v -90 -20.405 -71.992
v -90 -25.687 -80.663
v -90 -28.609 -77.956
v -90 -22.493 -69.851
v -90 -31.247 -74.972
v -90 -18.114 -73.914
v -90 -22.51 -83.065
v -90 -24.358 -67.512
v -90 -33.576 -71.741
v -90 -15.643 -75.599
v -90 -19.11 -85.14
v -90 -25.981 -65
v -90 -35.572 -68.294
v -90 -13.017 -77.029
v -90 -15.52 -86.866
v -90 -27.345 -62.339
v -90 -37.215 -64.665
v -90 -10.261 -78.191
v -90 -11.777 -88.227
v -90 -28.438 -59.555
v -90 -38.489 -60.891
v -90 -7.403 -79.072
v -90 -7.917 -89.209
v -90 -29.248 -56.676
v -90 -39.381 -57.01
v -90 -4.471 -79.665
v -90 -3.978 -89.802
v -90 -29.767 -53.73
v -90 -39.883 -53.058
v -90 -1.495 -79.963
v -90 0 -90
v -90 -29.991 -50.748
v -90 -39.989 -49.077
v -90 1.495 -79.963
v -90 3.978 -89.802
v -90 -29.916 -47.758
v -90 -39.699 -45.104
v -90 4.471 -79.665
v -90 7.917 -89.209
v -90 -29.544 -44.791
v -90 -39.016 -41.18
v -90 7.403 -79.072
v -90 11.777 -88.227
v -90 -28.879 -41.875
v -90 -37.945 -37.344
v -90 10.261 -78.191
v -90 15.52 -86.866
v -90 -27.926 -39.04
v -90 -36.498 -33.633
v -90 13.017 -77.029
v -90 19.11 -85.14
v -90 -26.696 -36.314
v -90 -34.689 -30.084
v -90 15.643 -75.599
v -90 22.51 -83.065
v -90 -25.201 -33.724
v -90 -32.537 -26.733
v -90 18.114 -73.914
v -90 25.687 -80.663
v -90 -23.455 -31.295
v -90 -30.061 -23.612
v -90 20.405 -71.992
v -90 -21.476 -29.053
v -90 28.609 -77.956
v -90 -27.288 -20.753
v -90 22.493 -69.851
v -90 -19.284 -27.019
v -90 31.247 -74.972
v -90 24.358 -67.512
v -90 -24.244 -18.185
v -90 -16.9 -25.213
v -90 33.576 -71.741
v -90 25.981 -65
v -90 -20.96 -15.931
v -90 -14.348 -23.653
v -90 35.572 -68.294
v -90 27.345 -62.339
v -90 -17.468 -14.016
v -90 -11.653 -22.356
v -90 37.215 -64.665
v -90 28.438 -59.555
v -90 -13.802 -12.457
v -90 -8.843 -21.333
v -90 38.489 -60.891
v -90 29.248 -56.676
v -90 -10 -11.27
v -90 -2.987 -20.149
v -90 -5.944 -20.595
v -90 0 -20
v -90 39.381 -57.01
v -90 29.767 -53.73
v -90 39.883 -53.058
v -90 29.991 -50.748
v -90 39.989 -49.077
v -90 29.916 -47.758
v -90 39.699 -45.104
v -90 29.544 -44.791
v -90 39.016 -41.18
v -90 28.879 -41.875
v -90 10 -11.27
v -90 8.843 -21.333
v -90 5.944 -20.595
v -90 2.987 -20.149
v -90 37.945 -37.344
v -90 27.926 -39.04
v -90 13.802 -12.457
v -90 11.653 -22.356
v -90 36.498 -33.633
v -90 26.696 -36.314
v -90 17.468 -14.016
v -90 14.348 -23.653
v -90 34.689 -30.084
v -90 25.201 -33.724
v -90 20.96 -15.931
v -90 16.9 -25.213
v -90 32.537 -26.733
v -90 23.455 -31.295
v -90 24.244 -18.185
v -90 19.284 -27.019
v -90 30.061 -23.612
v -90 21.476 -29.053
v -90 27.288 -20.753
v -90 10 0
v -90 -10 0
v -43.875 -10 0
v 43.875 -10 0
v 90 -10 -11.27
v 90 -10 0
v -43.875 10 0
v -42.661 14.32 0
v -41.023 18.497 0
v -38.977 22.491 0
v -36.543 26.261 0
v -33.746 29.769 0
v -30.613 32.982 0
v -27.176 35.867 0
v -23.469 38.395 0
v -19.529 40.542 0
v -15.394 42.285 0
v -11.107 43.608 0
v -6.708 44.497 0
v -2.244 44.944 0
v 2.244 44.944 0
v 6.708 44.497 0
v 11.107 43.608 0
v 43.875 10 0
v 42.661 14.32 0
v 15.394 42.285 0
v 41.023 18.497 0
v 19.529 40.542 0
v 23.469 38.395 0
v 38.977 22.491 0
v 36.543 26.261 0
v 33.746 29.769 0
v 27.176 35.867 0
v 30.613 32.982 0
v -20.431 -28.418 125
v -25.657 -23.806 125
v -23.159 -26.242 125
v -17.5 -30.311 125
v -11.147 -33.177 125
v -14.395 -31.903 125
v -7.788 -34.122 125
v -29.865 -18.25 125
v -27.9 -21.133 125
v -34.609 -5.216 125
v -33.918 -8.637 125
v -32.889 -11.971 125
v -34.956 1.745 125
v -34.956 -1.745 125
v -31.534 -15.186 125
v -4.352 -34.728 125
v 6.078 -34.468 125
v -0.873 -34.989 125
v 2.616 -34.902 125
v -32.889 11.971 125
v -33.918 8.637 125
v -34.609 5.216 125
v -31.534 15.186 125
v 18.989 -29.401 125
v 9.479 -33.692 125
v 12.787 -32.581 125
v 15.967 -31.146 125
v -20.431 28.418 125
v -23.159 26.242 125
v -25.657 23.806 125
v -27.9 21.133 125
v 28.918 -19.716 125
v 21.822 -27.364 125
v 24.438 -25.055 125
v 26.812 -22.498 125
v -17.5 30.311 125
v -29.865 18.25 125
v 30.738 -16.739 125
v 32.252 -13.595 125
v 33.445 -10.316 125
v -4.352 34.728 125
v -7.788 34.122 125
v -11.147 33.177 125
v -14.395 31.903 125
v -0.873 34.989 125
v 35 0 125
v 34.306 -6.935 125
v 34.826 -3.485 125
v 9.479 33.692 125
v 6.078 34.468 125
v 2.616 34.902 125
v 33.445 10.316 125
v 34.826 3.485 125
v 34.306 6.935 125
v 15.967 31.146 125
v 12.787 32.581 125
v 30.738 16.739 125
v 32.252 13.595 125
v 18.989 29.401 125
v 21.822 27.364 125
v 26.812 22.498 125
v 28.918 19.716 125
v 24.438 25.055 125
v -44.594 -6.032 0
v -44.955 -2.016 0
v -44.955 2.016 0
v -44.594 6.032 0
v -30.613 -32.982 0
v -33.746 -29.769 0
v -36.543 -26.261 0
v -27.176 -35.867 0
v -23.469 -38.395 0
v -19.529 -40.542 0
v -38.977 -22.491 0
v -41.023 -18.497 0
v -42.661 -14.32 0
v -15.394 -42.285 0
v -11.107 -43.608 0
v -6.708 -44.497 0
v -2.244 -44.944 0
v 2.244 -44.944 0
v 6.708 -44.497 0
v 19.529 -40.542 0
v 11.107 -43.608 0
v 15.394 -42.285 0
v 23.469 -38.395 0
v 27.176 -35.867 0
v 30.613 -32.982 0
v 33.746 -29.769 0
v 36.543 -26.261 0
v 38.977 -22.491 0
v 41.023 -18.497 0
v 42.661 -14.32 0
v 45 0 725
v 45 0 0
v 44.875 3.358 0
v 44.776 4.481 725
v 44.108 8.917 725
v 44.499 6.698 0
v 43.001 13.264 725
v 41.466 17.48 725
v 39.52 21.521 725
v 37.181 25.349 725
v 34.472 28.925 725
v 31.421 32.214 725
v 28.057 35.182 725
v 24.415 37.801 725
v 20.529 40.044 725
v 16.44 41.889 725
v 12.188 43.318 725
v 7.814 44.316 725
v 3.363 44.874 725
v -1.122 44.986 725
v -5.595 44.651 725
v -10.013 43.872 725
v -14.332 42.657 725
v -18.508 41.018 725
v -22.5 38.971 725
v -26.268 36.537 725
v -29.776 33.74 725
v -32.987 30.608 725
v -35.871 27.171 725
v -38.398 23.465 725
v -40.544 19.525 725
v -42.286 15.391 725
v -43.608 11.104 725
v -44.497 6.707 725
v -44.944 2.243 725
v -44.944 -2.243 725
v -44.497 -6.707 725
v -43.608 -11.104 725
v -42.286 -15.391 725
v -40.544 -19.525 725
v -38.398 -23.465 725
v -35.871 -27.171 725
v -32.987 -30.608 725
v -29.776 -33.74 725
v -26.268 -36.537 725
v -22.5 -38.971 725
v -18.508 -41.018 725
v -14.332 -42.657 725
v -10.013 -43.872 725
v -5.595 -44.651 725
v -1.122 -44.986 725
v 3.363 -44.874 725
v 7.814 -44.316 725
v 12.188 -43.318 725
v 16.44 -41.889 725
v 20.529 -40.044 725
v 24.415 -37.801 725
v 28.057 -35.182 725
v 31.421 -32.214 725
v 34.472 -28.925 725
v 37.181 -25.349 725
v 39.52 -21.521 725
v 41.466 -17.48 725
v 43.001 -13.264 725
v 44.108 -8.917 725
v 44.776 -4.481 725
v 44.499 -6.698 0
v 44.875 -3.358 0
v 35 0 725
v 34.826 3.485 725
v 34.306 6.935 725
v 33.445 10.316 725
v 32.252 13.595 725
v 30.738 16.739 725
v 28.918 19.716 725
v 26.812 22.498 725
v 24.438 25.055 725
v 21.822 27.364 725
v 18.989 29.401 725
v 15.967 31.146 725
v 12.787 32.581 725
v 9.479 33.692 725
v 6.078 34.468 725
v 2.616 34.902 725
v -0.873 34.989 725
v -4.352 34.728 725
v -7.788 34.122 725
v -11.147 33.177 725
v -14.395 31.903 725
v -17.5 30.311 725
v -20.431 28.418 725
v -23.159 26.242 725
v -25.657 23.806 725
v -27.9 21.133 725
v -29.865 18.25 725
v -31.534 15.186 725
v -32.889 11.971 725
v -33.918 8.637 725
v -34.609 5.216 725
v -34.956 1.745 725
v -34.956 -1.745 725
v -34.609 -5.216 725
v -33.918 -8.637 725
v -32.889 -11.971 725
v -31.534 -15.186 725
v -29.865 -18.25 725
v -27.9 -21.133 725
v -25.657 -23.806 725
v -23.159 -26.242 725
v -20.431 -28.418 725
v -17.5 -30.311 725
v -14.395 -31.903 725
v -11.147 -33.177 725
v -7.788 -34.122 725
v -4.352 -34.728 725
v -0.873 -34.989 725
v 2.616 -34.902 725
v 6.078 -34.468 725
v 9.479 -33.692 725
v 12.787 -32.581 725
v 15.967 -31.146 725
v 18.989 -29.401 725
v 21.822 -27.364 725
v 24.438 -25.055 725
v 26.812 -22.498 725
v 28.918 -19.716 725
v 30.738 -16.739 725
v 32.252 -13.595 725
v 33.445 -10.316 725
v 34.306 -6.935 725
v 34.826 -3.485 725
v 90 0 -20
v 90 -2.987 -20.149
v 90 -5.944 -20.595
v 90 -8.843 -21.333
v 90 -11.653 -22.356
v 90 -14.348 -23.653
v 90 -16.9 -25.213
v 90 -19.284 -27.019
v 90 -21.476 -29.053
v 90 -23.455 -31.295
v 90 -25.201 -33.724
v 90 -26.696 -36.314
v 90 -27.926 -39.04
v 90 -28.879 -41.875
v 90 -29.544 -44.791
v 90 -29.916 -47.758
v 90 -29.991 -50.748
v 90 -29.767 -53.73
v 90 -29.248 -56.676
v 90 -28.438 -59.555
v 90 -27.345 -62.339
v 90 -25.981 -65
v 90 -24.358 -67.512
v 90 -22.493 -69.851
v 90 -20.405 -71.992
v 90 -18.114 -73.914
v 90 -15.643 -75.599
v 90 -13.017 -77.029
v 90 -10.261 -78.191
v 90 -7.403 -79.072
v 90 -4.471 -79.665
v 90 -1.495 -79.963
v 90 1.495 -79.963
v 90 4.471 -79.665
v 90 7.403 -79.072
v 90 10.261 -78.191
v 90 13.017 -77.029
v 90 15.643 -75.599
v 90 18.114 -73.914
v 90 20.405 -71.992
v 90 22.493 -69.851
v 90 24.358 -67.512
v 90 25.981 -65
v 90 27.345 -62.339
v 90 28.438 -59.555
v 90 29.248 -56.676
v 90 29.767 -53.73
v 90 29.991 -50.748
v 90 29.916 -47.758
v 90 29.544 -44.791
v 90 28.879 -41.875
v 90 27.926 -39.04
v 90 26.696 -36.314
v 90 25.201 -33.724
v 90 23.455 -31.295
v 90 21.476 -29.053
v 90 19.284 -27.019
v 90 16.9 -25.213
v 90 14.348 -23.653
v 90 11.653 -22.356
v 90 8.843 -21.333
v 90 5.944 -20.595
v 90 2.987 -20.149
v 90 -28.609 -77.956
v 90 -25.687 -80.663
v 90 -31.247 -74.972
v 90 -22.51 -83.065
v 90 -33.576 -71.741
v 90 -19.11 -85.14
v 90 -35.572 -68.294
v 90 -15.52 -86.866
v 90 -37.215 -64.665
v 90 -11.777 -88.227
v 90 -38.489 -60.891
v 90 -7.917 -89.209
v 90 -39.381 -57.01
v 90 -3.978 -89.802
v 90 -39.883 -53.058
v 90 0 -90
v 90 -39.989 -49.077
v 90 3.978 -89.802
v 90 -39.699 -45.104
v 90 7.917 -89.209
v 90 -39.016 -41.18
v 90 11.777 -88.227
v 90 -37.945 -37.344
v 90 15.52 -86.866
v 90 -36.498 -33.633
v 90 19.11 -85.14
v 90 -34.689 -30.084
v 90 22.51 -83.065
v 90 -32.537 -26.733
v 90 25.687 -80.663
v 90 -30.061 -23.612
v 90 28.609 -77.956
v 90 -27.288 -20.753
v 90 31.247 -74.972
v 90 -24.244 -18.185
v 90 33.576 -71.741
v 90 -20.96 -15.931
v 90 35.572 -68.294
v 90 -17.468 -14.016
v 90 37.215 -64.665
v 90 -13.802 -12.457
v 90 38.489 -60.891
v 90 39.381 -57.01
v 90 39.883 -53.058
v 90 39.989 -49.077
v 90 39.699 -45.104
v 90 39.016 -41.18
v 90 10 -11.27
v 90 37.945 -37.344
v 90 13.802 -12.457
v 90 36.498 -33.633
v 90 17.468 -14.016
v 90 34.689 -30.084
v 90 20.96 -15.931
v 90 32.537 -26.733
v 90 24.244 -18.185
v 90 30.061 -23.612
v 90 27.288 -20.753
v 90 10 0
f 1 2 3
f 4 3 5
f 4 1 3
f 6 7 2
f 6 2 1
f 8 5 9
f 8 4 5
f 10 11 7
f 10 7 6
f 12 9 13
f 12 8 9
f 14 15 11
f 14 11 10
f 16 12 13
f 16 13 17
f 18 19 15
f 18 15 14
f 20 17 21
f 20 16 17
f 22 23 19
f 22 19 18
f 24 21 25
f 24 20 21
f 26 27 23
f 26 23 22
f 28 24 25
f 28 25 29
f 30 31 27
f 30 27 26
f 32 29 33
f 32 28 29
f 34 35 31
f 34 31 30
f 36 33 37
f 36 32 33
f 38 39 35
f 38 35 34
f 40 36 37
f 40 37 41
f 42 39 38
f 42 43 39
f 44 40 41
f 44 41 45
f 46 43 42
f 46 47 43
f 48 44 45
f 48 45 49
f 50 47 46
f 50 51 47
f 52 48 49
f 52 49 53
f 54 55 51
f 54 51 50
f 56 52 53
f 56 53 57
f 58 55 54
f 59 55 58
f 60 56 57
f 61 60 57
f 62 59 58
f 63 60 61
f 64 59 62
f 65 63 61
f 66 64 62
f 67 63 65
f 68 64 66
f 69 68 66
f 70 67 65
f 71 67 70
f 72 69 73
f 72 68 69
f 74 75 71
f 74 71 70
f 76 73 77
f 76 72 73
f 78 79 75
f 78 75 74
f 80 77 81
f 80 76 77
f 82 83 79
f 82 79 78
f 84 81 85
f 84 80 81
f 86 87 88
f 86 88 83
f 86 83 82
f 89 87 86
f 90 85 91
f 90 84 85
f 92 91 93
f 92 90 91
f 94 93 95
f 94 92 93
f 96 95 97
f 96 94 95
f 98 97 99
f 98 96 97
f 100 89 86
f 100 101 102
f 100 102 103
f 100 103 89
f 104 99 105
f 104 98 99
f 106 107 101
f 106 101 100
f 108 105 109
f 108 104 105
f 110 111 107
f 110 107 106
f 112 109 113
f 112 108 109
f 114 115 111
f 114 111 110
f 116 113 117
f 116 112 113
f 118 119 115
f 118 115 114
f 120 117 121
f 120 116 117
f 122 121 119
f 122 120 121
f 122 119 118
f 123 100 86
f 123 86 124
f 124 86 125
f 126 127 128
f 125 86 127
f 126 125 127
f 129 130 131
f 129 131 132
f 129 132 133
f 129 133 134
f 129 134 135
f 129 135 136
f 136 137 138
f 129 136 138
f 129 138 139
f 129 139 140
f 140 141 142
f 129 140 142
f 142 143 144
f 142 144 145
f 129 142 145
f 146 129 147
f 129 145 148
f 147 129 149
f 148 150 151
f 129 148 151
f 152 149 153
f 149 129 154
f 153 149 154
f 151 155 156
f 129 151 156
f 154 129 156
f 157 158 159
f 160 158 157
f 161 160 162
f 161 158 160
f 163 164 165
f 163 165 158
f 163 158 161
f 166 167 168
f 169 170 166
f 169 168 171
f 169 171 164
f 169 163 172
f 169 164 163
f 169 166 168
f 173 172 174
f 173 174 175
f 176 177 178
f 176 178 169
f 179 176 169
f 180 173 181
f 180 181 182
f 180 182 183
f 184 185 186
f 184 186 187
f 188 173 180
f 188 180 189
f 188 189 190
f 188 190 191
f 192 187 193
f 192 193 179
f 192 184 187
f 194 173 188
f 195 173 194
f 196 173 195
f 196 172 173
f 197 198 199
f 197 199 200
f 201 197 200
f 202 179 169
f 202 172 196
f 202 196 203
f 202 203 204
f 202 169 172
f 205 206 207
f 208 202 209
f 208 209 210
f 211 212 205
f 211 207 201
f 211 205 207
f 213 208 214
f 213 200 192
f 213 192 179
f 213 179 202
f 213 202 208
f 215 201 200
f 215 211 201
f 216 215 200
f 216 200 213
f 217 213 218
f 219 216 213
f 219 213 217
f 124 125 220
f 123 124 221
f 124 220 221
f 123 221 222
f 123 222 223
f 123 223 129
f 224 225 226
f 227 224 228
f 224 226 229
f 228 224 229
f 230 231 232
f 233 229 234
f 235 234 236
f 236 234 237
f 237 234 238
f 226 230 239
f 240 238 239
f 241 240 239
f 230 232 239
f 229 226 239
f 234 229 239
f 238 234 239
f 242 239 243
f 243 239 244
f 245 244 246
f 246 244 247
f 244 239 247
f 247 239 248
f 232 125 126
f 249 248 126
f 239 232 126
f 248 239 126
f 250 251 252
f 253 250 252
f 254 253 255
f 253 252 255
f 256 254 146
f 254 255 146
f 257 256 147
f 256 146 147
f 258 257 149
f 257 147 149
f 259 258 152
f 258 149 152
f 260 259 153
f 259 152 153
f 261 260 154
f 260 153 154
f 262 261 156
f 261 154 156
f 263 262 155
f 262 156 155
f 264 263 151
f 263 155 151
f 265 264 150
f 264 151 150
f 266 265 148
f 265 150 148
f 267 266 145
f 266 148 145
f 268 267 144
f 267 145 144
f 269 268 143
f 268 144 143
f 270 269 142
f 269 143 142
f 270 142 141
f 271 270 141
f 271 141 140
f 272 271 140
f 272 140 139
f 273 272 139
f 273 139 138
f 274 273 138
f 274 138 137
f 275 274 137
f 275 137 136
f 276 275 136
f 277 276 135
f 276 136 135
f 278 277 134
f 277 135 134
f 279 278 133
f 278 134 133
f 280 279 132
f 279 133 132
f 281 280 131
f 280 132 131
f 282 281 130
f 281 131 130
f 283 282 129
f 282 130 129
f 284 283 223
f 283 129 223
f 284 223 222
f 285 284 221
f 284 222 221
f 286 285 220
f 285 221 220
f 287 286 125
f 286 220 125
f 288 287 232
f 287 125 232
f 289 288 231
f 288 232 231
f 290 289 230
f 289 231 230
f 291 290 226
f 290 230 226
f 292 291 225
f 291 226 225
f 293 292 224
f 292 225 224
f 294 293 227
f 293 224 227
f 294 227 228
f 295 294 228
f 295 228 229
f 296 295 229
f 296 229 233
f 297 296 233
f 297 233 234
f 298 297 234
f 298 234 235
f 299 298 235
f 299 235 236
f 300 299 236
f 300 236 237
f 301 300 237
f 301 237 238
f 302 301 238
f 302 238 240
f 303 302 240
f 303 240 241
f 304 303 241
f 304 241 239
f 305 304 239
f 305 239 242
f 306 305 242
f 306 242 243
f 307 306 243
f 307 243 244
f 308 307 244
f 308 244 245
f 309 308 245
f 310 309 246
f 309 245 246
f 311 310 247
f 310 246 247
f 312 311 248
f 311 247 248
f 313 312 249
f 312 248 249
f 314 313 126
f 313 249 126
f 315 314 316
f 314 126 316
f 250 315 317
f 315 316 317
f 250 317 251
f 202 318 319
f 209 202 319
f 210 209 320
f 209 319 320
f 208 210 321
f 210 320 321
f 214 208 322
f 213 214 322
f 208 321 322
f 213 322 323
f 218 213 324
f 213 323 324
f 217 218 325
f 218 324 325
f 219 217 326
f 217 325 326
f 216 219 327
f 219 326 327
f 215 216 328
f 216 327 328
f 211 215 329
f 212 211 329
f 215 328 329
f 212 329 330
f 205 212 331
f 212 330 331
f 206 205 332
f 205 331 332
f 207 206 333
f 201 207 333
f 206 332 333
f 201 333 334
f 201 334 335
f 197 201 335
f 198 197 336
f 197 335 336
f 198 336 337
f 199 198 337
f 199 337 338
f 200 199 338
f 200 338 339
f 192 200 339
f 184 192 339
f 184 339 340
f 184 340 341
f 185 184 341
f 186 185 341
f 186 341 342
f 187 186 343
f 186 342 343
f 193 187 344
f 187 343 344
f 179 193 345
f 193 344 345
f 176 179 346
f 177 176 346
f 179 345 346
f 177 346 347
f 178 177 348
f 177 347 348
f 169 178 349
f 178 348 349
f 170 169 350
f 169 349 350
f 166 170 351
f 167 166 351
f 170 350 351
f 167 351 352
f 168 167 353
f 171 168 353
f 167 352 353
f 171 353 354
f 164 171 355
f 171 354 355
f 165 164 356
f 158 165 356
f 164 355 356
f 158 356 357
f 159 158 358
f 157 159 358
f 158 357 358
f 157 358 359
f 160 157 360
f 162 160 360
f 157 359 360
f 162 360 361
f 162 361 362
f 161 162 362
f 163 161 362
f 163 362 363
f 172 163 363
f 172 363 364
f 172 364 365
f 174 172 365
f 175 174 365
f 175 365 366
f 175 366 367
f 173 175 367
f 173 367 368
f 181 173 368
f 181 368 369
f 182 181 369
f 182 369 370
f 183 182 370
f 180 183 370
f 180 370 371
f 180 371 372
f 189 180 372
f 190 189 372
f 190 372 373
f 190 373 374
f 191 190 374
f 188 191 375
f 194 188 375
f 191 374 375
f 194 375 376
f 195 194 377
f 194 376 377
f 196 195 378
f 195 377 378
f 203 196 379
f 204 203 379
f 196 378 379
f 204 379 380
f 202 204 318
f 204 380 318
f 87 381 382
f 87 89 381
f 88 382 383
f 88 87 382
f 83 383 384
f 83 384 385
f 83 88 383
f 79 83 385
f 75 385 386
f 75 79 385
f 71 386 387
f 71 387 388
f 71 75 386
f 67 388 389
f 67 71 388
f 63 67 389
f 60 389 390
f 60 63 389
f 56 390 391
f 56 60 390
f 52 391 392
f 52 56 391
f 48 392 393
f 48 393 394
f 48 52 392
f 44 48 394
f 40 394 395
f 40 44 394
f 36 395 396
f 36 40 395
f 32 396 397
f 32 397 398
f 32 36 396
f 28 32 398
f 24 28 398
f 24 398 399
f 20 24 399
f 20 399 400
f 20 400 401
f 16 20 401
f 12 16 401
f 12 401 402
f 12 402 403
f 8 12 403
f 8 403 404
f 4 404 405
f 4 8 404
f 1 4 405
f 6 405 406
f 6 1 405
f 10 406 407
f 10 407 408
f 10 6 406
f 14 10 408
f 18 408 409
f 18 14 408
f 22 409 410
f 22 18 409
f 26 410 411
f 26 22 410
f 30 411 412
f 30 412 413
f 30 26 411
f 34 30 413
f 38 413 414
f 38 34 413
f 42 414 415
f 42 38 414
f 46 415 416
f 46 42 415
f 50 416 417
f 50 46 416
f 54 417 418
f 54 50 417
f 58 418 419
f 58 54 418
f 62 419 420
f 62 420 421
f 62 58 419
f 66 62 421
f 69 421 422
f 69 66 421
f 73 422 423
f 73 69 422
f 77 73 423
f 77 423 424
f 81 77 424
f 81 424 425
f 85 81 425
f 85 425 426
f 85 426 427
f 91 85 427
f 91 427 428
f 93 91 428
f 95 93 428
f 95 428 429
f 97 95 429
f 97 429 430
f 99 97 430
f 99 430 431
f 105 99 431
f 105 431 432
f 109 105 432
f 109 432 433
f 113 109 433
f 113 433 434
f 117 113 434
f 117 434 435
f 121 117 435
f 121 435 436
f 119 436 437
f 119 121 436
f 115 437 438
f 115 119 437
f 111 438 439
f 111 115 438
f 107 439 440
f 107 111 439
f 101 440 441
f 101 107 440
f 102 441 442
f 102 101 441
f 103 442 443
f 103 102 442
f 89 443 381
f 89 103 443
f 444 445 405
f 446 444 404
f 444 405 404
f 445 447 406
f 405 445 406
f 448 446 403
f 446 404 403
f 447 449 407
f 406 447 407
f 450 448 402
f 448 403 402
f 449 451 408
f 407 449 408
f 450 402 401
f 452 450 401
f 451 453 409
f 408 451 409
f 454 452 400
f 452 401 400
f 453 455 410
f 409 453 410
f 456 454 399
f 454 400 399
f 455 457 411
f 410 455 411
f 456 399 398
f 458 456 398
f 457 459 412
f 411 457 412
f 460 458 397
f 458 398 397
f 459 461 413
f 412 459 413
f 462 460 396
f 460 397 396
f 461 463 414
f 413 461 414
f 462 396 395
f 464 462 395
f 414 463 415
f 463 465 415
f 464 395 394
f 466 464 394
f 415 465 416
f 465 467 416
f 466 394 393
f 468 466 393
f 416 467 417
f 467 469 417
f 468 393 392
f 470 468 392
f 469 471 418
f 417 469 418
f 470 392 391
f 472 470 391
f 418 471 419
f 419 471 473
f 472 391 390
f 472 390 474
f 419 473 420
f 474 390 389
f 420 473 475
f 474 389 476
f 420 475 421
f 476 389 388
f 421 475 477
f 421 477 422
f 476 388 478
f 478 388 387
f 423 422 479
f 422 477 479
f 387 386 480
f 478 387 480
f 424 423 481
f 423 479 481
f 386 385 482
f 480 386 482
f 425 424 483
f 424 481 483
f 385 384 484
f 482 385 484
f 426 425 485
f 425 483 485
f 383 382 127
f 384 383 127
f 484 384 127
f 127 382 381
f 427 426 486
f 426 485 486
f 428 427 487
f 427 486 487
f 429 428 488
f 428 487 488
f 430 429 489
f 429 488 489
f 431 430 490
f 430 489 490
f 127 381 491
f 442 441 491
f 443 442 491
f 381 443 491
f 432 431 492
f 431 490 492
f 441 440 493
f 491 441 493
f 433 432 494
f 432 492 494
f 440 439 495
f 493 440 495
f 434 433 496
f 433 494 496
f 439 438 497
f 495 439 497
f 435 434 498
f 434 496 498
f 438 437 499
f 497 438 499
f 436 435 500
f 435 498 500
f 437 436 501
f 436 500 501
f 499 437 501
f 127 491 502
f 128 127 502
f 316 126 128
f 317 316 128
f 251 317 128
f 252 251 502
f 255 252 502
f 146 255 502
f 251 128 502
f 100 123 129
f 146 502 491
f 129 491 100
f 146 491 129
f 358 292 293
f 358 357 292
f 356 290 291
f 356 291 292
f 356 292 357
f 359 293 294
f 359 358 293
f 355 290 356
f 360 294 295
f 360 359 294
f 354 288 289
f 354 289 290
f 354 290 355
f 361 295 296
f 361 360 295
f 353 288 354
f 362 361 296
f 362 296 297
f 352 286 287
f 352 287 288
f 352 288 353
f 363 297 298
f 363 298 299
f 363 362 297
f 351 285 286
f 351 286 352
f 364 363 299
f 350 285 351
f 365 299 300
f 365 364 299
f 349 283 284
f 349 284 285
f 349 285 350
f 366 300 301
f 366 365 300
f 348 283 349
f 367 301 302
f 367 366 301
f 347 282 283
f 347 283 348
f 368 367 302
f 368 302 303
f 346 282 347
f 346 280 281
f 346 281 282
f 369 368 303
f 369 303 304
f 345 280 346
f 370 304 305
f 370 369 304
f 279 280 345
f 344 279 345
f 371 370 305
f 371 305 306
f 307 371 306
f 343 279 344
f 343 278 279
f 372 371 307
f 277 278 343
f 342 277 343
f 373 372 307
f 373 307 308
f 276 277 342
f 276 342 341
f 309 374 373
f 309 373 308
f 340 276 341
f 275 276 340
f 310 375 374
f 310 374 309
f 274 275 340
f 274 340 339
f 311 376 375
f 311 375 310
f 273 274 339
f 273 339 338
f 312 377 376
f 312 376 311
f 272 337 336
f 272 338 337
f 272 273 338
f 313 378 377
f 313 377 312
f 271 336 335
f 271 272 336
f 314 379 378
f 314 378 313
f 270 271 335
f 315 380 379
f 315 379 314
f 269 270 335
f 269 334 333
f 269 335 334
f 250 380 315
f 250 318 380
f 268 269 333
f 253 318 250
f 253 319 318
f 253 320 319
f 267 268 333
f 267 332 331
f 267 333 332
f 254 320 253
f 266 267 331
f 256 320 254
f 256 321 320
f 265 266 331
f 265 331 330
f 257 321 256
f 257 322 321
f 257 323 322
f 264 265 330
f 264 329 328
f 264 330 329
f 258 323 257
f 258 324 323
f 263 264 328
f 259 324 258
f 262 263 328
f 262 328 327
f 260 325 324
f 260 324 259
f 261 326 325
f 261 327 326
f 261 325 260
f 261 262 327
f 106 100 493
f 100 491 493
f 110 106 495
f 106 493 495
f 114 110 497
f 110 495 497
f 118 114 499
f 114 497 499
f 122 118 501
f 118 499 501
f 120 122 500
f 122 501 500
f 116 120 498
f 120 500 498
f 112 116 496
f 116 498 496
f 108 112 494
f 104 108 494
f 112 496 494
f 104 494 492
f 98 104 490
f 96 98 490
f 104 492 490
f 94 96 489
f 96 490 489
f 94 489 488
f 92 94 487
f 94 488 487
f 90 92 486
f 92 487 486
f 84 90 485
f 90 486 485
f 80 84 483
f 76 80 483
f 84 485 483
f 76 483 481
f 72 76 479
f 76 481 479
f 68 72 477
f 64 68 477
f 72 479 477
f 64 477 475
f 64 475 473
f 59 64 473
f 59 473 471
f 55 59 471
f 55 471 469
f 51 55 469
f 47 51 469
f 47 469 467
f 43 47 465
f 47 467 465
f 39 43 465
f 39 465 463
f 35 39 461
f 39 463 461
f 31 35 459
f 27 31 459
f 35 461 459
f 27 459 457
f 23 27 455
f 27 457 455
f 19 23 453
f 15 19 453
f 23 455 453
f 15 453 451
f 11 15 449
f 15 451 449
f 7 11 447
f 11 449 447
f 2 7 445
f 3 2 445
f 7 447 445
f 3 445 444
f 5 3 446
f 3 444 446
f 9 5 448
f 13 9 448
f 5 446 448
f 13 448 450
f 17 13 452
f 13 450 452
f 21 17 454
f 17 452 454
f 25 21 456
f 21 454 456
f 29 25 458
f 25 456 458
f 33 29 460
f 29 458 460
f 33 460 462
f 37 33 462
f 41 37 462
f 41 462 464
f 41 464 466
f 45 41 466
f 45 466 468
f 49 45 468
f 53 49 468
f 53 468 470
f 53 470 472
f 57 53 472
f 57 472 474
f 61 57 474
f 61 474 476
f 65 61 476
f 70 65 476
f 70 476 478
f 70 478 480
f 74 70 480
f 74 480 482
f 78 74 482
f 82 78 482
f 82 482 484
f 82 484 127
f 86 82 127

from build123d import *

# Parameters (mm, degrees)
IZIM1_R                     = 45
Y_KSEKLIK_EKSTR_ZYON1_DEPTH = 725
IZIM2_R                     = 35
KES_EKSTR_ZYON1_DEPTH       = 600
IZIM3_R                     = 30
Y_KSEKLIK_EKSTR_ZYON2_DEPTH = 90


with BuildPart() as part:
    # Çizim1 → Yükseklik-Ekstrüzyon1 (new body)
    with BuildSketch(Plane.XY):
        Circle(IZIM1_R)
    extrude(amount=Y_KSEKLIK_EKSTR_ZYON1_DEPTH)

    # Çizim2 → Kes-Ekstrüzyon1 (cut)
    with BuildSketch(Plane.XY.offset(725)):
        Circle(IZIM2_R)
    extrude(amount=-KES_EKSTR_ZYON1_DEPTH, mode=Mode.SUBTRACT)

    # Çizim3 → Yükseklik-Ekstrüzyon2 (add, symmetric)
    with BuildSketch(Plane(origin=(0, 0, 0), x_dir=(0, 0, -1), z_dir=(1, 0, 0))):
        with BuildLine():
            Line((0, 10), (11.270166538, 10))
            ThreePointArc((11.270166538, 10), (90, 0), (11.270166538, -10))
            Line((11.270166538, -10), (0, -10))
            Line((0, -10), (0, 10))
        make_face()
        with Locations(Location((50, 0, 0), (0, 0, 180))):
            Circle(IZIM3_R, mode=Mode.SUBTRACT)
    extrude(amount=Y_KSEKLIK_EKSTR_ZYON2_DEPTH, both=True)


solid = part.part
